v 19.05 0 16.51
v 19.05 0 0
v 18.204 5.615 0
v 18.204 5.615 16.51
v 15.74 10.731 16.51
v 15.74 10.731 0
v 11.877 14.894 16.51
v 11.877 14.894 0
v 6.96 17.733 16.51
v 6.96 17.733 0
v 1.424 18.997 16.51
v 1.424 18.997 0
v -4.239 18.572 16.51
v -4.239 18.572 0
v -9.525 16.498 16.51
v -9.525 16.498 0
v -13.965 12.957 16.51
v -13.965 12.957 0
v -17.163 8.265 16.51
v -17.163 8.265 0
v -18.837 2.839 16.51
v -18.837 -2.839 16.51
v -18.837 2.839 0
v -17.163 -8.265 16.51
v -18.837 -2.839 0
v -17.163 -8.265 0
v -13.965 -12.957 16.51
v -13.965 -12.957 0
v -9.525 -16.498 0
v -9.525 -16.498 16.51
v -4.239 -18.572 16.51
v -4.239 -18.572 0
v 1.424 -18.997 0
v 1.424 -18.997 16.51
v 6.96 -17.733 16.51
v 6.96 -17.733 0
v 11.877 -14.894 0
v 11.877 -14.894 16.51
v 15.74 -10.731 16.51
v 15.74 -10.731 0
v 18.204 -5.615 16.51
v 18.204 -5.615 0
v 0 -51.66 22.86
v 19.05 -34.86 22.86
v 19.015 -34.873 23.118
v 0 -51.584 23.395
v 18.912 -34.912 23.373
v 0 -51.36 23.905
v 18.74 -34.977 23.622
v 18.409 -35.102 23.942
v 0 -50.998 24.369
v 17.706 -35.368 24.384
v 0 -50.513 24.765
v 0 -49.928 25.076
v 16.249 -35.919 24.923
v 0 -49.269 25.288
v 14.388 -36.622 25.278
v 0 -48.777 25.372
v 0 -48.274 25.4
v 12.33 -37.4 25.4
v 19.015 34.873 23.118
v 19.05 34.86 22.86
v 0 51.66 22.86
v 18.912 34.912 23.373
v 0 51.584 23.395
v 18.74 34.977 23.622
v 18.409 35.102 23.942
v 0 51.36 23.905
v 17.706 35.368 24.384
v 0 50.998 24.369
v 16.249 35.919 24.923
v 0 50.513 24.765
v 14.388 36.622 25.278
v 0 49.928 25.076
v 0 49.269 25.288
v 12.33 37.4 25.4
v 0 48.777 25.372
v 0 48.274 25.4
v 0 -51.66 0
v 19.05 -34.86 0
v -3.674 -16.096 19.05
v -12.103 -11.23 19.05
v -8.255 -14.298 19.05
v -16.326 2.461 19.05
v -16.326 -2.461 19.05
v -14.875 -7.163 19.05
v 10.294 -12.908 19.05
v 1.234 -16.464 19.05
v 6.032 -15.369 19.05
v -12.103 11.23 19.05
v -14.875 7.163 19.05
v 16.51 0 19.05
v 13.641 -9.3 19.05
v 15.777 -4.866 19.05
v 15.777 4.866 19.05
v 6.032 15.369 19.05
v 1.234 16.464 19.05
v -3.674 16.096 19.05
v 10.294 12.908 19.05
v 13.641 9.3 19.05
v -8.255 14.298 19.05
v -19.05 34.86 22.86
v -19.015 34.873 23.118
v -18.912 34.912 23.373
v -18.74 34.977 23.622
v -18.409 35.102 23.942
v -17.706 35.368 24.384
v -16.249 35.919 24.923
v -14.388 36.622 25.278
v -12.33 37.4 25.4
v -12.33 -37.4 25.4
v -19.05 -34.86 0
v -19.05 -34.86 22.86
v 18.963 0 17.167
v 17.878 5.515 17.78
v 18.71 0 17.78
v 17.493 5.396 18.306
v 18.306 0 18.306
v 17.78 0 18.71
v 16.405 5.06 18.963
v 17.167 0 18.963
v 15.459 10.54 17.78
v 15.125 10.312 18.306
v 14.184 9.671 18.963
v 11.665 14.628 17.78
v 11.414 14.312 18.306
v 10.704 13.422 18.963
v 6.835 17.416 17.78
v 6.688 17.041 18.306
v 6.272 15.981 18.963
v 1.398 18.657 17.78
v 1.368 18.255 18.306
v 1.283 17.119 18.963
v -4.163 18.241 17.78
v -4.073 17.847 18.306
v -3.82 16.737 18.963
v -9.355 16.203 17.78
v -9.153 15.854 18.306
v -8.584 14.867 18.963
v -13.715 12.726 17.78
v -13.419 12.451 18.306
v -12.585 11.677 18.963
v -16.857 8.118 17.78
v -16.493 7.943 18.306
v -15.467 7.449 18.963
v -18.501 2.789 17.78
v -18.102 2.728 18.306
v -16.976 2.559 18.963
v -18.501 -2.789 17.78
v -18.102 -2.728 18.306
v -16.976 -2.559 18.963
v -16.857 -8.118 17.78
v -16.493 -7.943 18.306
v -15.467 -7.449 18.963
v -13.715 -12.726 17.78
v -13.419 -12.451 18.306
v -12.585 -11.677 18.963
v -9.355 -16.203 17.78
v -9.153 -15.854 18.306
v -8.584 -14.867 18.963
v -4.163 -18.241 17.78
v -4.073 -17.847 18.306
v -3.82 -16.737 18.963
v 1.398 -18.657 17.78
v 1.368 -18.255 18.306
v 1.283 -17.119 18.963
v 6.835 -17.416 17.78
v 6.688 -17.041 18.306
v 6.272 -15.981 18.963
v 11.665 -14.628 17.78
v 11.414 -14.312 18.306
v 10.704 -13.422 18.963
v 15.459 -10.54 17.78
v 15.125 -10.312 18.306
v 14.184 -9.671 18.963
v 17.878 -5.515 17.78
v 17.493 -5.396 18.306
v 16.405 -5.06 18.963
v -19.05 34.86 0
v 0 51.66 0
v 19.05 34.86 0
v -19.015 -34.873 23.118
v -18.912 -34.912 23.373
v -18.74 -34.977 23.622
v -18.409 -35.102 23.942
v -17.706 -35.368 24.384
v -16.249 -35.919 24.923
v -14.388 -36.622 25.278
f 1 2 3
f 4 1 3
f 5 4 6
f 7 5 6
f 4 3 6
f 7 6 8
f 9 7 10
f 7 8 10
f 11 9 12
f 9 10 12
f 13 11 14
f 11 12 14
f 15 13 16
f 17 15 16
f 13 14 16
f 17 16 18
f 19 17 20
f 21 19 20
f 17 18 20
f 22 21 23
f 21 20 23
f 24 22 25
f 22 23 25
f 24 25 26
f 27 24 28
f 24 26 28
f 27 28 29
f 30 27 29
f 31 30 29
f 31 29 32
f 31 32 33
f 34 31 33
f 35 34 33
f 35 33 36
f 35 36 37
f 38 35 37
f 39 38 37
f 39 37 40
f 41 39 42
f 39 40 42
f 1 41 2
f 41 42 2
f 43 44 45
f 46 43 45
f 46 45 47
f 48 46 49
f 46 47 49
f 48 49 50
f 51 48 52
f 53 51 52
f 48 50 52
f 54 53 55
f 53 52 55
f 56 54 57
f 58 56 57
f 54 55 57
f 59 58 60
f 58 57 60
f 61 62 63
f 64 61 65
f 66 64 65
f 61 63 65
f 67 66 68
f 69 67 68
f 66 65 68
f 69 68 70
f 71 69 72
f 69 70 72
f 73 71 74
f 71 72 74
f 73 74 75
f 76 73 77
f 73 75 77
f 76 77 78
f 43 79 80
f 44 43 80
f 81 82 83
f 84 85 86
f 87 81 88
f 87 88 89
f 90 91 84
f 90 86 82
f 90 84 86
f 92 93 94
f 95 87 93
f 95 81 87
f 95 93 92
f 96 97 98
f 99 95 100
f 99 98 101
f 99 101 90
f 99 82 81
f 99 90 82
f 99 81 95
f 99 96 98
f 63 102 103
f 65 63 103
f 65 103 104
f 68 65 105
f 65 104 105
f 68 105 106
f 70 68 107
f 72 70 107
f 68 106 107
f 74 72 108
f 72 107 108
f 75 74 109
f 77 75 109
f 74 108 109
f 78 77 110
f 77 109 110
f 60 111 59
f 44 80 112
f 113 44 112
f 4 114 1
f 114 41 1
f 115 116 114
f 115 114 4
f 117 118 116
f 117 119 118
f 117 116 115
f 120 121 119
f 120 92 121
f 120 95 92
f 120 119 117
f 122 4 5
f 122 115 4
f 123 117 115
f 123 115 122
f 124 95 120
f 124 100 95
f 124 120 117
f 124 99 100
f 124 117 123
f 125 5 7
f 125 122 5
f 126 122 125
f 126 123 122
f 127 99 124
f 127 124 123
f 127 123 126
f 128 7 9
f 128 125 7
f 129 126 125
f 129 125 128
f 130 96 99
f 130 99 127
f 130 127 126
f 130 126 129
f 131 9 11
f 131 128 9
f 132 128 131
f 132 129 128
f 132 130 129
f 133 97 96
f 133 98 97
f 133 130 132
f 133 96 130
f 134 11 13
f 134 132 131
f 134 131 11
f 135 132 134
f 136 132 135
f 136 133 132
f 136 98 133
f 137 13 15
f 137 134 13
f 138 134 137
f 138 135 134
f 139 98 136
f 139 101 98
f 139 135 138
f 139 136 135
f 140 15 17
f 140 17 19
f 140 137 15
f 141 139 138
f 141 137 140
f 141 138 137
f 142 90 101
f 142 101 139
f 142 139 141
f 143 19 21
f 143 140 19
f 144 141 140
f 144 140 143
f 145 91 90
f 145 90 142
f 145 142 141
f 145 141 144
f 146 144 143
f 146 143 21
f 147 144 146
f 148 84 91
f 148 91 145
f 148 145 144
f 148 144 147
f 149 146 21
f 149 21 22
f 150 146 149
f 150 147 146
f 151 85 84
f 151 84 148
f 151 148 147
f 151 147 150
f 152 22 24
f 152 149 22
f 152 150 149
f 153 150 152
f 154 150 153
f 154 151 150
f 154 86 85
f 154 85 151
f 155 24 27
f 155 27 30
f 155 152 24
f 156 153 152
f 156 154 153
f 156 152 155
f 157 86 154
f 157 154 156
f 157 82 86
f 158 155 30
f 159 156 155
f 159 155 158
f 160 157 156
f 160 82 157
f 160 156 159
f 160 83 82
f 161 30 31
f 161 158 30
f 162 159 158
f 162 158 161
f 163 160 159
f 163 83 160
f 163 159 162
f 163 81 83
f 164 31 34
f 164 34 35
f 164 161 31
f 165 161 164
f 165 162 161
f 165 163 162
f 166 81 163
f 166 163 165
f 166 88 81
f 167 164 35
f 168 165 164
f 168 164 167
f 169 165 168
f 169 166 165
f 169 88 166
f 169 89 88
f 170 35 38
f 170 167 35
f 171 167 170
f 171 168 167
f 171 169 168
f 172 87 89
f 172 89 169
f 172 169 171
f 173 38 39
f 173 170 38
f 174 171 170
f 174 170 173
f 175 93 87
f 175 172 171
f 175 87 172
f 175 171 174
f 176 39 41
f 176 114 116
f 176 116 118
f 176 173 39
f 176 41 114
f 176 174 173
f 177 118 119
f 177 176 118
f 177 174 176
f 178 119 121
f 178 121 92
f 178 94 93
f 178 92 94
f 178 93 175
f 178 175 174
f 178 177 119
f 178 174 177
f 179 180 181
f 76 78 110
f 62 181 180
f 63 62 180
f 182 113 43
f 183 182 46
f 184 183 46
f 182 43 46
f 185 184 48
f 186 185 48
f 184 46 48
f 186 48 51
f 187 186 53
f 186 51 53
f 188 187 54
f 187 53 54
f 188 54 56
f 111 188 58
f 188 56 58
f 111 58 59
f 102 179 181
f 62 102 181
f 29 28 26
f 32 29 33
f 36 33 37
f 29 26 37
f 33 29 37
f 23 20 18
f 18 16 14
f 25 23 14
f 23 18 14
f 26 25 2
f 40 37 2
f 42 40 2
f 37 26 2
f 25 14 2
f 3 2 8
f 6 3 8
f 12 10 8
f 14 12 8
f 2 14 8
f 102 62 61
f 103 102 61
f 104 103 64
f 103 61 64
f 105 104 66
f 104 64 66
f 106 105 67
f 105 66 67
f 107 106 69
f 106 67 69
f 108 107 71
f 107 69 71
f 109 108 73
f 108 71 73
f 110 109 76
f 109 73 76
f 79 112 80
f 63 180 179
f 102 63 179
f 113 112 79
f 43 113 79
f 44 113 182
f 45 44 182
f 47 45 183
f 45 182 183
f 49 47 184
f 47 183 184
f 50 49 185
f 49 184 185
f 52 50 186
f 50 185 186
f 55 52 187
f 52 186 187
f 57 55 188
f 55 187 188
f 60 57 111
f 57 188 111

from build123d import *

# Parameters (mm, degrees)
F1_DEPTH = 25.4
F0_R     = 19.05
F2_DEPTH = 19.05
F3_R     = 2.54
F3_2_R   = 2.54


with BuildPart() as f1:
    # F0 (on Top) → F1 (new body)
    with BuildSketch(Plane.XY):
        Polygon((0, 51.660344), (-19.05, 34.859824), (19.05, 34.859824), align=None)
        Polygon((19.05, -34.859824), (0, -34.859824), (-19.05, -34.859824), (0, -51.660344), align=None)
    extrude(amount=F1_DEPTH)

    # F3#2
    f3_2_edges = [f1.edges().sort_by_distance(p)[0] for p in [
        (0, 34.859824, 25.4),
        (9.525, 43.260084, 25.4),
        (-9.525, 43.260084, 25.4),
        (-9.525, -43.260084, 25.4),
        (9.525, -43.260084, 25.4),
        (0, -34.859824, 25.4),
    ]]
    fillet(f3_2_edges, radius=F3_2_R)


with BuildPart() as f2:
    # F0 (on Top) → F2 (new body)
    with BuildSketch(Plane.XY):
        Circle(F0_R)
    extrude(amount=F2_DEPTH)

    # F3
    f3_edges = [f2.edges().sort_by_distance(p)[0] for p in [
        (-19.05, 0, 19.05),
    ]]
    fillet(f3_edges, radius=F3_R)


solid = Compound([f1.part, f2.part])
